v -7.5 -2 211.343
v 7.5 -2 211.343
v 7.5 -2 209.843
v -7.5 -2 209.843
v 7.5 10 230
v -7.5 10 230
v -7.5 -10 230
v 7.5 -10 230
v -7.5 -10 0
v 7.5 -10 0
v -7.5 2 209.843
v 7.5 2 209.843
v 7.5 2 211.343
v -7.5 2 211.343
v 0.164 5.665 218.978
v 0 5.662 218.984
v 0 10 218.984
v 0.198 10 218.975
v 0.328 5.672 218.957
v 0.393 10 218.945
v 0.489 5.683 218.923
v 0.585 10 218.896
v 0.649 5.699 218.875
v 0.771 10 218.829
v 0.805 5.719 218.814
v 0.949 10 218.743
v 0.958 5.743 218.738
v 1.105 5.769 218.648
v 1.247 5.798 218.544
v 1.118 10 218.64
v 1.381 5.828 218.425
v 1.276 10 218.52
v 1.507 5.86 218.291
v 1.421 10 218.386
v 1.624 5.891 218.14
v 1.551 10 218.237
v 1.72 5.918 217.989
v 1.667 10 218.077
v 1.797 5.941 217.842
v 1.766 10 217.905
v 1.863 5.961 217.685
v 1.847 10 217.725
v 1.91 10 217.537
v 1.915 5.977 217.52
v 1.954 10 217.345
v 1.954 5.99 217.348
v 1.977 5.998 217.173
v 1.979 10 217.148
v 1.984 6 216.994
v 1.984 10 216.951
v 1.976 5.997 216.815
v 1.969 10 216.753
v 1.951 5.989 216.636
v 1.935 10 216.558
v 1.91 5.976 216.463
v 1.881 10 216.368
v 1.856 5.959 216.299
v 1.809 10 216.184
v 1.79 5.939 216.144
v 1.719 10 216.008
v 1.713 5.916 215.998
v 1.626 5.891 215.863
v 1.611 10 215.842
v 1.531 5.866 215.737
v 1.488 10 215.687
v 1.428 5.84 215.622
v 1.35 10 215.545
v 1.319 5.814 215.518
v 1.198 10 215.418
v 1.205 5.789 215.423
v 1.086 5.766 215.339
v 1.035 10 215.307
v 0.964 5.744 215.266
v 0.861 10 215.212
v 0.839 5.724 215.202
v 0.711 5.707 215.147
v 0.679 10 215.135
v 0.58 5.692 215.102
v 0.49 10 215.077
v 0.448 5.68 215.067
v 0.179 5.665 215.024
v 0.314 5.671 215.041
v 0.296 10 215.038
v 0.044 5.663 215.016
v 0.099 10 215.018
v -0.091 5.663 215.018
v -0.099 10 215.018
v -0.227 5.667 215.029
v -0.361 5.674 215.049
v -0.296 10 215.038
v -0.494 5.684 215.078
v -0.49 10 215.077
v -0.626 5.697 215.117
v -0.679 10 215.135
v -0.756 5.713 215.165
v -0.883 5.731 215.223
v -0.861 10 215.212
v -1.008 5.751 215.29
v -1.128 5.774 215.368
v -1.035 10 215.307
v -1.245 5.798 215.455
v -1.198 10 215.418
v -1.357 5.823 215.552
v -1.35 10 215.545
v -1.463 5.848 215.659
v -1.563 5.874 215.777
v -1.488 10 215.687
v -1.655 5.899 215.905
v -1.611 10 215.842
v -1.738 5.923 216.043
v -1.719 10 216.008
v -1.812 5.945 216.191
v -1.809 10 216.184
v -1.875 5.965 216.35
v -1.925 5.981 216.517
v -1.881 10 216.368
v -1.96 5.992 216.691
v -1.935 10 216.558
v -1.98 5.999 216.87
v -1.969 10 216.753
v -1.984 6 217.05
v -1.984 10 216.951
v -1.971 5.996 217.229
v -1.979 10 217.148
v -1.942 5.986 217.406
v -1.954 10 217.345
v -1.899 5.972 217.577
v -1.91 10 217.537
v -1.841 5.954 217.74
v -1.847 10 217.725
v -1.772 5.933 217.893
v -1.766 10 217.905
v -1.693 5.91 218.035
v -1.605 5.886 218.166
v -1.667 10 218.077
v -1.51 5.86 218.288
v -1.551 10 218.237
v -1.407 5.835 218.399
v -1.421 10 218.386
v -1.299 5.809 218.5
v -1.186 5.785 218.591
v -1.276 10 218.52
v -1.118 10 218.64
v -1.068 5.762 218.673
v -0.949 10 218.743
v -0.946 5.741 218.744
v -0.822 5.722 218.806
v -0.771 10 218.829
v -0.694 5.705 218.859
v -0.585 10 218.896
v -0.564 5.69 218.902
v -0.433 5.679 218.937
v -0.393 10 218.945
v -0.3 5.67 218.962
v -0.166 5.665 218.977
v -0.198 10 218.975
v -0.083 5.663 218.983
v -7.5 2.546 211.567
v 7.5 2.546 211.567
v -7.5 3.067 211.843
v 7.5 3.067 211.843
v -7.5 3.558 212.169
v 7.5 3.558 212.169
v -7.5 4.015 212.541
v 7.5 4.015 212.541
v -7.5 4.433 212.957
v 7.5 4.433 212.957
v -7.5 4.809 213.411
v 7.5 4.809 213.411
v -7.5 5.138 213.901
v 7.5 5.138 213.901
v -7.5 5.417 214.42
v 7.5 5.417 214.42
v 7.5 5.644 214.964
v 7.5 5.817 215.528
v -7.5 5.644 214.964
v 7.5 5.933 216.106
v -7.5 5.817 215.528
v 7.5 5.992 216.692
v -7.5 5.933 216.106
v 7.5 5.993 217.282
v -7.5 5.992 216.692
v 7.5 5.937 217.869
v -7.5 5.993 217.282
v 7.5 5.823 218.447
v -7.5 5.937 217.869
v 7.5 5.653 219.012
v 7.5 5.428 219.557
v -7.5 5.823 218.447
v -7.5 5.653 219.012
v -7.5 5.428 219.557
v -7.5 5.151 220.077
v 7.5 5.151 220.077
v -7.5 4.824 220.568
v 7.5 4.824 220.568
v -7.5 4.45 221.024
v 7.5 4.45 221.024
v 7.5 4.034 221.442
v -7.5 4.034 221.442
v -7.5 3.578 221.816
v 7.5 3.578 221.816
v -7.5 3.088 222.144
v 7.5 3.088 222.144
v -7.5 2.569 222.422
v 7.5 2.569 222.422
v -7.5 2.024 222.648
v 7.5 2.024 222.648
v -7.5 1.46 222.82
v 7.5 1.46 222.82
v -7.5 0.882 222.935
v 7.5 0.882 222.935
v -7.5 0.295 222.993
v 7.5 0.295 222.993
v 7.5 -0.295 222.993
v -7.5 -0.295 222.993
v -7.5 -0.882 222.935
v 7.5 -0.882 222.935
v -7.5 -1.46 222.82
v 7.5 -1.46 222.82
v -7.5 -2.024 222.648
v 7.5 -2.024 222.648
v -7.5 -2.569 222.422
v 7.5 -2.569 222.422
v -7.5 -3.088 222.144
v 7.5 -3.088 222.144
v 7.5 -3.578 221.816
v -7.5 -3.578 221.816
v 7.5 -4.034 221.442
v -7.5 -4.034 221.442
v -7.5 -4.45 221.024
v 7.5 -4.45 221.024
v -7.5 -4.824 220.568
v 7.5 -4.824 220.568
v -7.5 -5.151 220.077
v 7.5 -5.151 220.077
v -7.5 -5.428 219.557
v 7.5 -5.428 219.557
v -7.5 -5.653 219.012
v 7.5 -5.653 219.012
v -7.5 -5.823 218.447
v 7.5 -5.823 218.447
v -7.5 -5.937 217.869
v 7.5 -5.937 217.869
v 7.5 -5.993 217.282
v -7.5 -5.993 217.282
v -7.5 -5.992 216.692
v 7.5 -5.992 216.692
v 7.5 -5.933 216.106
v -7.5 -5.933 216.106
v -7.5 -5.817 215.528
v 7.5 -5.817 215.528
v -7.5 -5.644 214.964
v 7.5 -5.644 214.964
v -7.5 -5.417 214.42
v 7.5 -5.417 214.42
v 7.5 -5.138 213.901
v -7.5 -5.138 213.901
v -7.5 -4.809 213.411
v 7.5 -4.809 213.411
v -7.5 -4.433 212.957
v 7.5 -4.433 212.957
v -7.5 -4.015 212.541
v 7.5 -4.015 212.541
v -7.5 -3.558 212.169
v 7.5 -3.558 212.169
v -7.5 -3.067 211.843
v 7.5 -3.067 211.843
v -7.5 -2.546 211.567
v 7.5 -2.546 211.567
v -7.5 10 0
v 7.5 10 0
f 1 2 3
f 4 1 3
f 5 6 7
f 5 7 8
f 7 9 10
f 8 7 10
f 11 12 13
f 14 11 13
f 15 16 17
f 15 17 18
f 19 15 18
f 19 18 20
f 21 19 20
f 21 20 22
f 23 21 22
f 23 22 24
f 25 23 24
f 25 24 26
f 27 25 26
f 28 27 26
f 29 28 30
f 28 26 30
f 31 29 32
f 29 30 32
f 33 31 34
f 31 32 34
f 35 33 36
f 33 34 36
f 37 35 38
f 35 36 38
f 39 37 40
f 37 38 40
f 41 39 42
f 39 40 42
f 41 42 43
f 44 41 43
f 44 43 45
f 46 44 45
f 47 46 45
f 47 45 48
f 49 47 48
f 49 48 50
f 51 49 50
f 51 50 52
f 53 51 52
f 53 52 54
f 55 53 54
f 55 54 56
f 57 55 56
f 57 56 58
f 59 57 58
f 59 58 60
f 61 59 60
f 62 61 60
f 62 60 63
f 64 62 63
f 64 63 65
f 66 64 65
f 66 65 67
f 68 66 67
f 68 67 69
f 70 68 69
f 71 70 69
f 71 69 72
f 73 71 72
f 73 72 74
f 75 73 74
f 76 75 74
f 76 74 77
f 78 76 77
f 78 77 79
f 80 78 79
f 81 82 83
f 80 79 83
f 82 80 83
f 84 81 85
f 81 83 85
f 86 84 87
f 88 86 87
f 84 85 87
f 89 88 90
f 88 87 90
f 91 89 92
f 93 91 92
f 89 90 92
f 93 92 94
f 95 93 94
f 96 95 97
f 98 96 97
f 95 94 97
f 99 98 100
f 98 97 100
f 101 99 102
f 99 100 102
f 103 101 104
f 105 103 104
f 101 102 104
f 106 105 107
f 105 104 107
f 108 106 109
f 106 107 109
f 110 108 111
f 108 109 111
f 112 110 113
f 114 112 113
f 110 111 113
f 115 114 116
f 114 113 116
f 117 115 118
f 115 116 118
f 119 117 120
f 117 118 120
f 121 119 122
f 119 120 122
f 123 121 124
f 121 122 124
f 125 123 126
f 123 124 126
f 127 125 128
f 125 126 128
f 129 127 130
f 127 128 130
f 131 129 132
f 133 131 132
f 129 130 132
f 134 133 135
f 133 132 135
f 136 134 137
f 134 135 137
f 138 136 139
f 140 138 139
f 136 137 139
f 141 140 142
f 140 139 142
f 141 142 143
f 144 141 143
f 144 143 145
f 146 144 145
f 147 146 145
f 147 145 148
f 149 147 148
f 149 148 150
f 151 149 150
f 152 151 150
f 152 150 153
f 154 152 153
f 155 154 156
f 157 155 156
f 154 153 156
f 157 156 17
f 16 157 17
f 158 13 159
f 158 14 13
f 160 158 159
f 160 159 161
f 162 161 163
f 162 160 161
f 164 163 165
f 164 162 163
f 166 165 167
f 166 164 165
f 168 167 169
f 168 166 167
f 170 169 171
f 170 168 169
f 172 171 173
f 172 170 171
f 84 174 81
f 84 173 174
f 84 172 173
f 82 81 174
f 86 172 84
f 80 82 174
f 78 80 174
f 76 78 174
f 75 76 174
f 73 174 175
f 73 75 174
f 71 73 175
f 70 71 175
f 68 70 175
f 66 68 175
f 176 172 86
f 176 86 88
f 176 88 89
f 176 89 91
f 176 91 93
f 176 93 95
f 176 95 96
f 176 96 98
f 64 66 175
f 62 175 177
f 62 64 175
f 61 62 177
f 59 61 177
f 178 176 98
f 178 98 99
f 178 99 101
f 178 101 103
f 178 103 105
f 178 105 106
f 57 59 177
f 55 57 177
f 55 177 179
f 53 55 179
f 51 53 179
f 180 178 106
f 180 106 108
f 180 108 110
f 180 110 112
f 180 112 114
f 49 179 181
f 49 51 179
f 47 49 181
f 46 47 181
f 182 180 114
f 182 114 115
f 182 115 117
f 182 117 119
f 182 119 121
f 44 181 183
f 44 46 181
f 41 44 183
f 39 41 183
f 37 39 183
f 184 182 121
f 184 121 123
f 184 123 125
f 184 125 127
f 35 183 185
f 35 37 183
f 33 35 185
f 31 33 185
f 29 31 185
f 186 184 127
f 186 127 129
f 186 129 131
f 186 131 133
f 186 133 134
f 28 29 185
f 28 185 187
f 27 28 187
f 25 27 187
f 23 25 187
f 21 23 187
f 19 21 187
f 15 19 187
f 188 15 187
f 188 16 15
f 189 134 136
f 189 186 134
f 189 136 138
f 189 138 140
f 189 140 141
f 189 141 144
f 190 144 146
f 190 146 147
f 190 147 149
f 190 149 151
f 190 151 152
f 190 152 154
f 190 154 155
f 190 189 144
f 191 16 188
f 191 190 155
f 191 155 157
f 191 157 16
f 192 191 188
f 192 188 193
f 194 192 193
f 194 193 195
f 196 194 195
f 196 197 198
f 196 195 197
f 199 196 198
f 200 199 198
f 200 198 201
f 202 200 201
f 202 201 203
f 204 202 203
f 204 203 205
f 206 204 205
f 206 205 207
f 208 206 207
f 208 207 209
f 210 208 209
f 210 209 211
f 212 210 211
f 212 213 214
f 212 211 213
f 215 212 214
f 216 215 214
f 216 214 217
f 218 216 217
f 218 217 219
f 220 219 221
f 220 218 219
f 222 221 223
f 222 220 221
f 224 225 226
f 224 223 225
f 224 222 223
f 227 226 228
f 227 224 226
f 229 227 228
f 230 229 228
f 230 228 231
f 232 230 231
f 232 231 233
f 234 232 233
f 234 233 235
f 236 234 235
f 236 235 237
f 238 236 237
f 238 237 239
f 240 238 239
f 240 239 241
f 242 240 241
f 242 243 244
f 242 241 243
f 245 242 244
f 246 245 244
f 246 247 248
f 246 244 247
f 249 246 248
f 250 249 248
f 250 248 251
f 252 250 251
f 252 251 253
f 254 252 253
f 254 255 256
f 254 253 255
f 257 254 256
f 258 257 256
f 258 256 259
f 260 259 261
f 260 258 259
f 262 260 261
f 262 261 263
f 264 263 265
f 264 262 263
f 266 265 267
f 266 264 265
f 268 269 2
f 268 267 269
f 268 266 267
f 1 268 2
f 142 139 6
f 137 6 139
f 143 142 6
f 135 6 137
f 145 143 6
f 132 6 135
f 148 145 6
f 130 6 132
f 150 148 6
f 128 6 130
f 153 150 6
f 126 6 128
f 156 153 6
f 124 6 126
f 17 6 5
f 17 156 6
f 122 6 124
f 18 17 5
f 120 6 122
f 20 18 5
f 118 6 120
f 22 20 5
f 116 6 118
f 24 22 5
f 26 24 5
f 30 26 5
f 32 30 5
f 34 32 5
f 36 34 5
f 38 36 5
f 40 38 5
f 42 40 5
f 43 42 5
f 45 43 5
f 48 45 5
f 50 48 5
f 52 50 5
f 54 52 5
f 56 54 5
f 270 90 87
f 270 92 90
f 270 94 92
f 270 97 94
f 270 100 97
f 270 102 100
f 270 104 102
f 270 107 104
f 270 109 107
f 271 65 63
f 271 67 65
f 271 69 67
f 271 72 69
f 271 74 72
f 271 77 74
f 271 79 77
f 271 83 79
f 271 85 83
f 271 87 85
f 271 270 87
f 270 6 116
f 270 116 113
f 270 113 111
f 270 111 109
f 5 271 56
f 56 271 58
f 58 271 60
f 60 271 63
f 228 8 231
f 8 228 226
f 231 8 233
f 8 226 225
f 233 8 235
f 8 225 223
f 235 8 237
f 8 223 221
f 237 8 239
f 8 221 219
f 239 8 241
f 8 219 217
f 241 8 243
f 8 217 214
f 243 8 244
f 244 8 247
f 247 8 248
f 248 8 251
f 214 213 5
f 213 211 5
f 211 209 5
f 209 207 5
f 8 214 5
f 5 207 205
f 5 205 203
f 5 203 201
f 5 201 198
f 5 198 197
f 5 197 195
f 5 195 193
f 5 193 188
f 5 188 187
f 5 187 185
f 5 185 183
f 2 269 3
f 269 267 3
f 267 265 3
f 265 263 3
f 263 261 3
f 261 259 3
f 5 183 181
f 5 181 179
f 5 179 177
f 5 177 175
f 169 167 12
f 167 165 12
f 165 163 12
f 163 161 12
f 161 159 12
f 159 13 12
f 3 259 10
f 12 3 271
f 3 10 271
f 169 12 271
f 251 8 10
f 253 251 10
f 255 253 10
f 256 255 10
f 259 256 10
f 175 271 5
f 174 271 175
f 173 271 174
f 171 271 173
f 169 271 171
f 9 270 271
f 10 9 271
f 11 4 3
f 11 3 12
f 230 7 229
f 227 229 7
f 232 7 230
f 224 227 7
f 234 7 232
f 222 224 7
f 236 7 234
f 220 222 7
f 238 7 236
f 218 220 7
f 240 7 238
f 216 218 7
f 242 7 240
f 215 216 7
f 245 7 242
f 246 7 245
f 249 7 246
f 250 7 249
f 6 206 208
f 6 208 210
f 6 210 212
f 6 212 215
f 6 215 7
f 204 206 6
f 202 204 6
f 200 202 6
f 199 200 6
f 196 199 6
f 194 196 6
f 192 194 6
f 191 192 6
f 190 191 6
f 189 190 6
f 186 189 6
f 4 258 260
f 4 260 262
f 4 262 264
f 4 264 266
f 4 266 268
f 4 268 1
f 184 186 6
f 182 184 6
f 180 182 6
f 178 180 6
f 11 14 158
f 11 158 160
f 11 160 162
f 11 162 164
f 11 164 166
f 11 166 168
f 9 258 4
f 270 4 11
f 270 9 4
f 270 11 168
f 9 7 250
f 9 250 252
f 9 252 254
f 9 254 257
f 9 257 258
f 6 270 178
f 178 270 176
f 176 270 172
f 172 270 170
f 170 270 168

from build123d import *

# Parameters (mm, degrees)
SKETCH1_W            = 15
SKETCH1_H            = 20
BOSS_EXTRUDE1_DEPTH  = 230
SKETCH2_W            = 65
SKETCH2_H            = 40
BOSS_EXTRUDE6_DEPTH  = 5
SKETCH7_W            = 75
SKETCH7_H            = 15
BOSS_EXTRUDE7_DEPTH  = 5
SKETCH8_W            = 75
SKETCH8_H            = 15
BOSS_EXTRUDE8_DEPTH  = 5
SKETCH9_W            = 65
SKETCH9_H            = 40
BOSS_EXTRUDE11_DEPTH = 5
CUT_EXTRUDE1_DEPTH   = 240.635139326
SKETCH13_R           = 1.984375
CUT_EXTRUDE2_DEPTH   = 10


with BuildPart() as part:
    # Sketch1 → Boss-Extrude1 (new body)
    with BuildSketch(Plane.XY):
        Rectangle(SKETCH1_W, SKETCH1_H)
    extrude(amount=BOSS_EXTRUDE1_DEPTH)

    # Sketch10 → Cut-Extrude1 (cut, through all)
    with BuildSketch(Plane.ZY.offset(7.5)):
        with BuildLine():
            Line((209.843145751, 2), (211.343145751, 2))
            ThreePointArc((211.343145751, 2), (223, 0), (211.343145751, -2))
            Line((211.343145751, -2), (209.843145751, -2))
            Line((209.843145751, -2), (209.843145751, 2))
        make_face()
    extrude(amount=-CUT_EXTRUDE1_DEPTH, mode=Mode.SUBTRACT)

    # Sketch13 → Cut-Extrude2 (cut)
    with BuildSketch(Plane(origin=(0, 10, 0), x_dir=(1, 0, 0), z_dir=(0, 1, 0))):
        with Locations(Location((0, -217, 0), (0, 0, 270))):
            Circle(SKETCH13_R)
    extrude(amount=-CUT_EXTRUDE2_DEPTH, mode=Mode.SUBTRACT)


with BuildPart() as body_2:
    # Sketch2 → Boss-Extrude6 (new body)
    with BuildSketch(Plane(origin=(0, 0, 0), x_dir=(-1, 0, 0), z_dir=(0, 0, -1))):
        with Locations((0, 30)):
            Rectangle(SKETCH2_W, SKETCH2_H)
    extrude(amount=-BOSS_EXTRUDE6_DEPTH)


with BuildPart() as body_3:
    # Sketch7 → Boss-Extrude7 (new body)
    with BuildSketch(Plane(origin=(32.5, 0, 0), x_dir=(0, 0, -1), z_dir=(1, 0, 0))):
        with Locations((-37.5, 30)):
            Rectangle(SKETCH7_W, SKETCH7_H)
    extrude(amount=BOSS_EXTRUDE7_DEPTH)


with BuildPart() as body_4:
    # Sketch8 → Boss-Extrude8 (new body)
    with BuildSketch(Plane.ZY.offset(32.5)):
        with Locations((37.5, 30)):
            Rectangle(SKETCH8_W, SKETCH8_H)
    extrude(amount=BOSS_EXTRUDE8_DEPTH)


with BuildPart() as body_5:
    # Sketch9 → Boss-Extrude11 (new body)
    with BuildSketch(Plane.XY.offset(75)):
        with Locations((0, 30)):
            Rectangle(SKETCH9_W, SKETCH9_H)
    extrude(amount=-BOSS_EXTRUDE11_DEPTH)


solid = part.part
